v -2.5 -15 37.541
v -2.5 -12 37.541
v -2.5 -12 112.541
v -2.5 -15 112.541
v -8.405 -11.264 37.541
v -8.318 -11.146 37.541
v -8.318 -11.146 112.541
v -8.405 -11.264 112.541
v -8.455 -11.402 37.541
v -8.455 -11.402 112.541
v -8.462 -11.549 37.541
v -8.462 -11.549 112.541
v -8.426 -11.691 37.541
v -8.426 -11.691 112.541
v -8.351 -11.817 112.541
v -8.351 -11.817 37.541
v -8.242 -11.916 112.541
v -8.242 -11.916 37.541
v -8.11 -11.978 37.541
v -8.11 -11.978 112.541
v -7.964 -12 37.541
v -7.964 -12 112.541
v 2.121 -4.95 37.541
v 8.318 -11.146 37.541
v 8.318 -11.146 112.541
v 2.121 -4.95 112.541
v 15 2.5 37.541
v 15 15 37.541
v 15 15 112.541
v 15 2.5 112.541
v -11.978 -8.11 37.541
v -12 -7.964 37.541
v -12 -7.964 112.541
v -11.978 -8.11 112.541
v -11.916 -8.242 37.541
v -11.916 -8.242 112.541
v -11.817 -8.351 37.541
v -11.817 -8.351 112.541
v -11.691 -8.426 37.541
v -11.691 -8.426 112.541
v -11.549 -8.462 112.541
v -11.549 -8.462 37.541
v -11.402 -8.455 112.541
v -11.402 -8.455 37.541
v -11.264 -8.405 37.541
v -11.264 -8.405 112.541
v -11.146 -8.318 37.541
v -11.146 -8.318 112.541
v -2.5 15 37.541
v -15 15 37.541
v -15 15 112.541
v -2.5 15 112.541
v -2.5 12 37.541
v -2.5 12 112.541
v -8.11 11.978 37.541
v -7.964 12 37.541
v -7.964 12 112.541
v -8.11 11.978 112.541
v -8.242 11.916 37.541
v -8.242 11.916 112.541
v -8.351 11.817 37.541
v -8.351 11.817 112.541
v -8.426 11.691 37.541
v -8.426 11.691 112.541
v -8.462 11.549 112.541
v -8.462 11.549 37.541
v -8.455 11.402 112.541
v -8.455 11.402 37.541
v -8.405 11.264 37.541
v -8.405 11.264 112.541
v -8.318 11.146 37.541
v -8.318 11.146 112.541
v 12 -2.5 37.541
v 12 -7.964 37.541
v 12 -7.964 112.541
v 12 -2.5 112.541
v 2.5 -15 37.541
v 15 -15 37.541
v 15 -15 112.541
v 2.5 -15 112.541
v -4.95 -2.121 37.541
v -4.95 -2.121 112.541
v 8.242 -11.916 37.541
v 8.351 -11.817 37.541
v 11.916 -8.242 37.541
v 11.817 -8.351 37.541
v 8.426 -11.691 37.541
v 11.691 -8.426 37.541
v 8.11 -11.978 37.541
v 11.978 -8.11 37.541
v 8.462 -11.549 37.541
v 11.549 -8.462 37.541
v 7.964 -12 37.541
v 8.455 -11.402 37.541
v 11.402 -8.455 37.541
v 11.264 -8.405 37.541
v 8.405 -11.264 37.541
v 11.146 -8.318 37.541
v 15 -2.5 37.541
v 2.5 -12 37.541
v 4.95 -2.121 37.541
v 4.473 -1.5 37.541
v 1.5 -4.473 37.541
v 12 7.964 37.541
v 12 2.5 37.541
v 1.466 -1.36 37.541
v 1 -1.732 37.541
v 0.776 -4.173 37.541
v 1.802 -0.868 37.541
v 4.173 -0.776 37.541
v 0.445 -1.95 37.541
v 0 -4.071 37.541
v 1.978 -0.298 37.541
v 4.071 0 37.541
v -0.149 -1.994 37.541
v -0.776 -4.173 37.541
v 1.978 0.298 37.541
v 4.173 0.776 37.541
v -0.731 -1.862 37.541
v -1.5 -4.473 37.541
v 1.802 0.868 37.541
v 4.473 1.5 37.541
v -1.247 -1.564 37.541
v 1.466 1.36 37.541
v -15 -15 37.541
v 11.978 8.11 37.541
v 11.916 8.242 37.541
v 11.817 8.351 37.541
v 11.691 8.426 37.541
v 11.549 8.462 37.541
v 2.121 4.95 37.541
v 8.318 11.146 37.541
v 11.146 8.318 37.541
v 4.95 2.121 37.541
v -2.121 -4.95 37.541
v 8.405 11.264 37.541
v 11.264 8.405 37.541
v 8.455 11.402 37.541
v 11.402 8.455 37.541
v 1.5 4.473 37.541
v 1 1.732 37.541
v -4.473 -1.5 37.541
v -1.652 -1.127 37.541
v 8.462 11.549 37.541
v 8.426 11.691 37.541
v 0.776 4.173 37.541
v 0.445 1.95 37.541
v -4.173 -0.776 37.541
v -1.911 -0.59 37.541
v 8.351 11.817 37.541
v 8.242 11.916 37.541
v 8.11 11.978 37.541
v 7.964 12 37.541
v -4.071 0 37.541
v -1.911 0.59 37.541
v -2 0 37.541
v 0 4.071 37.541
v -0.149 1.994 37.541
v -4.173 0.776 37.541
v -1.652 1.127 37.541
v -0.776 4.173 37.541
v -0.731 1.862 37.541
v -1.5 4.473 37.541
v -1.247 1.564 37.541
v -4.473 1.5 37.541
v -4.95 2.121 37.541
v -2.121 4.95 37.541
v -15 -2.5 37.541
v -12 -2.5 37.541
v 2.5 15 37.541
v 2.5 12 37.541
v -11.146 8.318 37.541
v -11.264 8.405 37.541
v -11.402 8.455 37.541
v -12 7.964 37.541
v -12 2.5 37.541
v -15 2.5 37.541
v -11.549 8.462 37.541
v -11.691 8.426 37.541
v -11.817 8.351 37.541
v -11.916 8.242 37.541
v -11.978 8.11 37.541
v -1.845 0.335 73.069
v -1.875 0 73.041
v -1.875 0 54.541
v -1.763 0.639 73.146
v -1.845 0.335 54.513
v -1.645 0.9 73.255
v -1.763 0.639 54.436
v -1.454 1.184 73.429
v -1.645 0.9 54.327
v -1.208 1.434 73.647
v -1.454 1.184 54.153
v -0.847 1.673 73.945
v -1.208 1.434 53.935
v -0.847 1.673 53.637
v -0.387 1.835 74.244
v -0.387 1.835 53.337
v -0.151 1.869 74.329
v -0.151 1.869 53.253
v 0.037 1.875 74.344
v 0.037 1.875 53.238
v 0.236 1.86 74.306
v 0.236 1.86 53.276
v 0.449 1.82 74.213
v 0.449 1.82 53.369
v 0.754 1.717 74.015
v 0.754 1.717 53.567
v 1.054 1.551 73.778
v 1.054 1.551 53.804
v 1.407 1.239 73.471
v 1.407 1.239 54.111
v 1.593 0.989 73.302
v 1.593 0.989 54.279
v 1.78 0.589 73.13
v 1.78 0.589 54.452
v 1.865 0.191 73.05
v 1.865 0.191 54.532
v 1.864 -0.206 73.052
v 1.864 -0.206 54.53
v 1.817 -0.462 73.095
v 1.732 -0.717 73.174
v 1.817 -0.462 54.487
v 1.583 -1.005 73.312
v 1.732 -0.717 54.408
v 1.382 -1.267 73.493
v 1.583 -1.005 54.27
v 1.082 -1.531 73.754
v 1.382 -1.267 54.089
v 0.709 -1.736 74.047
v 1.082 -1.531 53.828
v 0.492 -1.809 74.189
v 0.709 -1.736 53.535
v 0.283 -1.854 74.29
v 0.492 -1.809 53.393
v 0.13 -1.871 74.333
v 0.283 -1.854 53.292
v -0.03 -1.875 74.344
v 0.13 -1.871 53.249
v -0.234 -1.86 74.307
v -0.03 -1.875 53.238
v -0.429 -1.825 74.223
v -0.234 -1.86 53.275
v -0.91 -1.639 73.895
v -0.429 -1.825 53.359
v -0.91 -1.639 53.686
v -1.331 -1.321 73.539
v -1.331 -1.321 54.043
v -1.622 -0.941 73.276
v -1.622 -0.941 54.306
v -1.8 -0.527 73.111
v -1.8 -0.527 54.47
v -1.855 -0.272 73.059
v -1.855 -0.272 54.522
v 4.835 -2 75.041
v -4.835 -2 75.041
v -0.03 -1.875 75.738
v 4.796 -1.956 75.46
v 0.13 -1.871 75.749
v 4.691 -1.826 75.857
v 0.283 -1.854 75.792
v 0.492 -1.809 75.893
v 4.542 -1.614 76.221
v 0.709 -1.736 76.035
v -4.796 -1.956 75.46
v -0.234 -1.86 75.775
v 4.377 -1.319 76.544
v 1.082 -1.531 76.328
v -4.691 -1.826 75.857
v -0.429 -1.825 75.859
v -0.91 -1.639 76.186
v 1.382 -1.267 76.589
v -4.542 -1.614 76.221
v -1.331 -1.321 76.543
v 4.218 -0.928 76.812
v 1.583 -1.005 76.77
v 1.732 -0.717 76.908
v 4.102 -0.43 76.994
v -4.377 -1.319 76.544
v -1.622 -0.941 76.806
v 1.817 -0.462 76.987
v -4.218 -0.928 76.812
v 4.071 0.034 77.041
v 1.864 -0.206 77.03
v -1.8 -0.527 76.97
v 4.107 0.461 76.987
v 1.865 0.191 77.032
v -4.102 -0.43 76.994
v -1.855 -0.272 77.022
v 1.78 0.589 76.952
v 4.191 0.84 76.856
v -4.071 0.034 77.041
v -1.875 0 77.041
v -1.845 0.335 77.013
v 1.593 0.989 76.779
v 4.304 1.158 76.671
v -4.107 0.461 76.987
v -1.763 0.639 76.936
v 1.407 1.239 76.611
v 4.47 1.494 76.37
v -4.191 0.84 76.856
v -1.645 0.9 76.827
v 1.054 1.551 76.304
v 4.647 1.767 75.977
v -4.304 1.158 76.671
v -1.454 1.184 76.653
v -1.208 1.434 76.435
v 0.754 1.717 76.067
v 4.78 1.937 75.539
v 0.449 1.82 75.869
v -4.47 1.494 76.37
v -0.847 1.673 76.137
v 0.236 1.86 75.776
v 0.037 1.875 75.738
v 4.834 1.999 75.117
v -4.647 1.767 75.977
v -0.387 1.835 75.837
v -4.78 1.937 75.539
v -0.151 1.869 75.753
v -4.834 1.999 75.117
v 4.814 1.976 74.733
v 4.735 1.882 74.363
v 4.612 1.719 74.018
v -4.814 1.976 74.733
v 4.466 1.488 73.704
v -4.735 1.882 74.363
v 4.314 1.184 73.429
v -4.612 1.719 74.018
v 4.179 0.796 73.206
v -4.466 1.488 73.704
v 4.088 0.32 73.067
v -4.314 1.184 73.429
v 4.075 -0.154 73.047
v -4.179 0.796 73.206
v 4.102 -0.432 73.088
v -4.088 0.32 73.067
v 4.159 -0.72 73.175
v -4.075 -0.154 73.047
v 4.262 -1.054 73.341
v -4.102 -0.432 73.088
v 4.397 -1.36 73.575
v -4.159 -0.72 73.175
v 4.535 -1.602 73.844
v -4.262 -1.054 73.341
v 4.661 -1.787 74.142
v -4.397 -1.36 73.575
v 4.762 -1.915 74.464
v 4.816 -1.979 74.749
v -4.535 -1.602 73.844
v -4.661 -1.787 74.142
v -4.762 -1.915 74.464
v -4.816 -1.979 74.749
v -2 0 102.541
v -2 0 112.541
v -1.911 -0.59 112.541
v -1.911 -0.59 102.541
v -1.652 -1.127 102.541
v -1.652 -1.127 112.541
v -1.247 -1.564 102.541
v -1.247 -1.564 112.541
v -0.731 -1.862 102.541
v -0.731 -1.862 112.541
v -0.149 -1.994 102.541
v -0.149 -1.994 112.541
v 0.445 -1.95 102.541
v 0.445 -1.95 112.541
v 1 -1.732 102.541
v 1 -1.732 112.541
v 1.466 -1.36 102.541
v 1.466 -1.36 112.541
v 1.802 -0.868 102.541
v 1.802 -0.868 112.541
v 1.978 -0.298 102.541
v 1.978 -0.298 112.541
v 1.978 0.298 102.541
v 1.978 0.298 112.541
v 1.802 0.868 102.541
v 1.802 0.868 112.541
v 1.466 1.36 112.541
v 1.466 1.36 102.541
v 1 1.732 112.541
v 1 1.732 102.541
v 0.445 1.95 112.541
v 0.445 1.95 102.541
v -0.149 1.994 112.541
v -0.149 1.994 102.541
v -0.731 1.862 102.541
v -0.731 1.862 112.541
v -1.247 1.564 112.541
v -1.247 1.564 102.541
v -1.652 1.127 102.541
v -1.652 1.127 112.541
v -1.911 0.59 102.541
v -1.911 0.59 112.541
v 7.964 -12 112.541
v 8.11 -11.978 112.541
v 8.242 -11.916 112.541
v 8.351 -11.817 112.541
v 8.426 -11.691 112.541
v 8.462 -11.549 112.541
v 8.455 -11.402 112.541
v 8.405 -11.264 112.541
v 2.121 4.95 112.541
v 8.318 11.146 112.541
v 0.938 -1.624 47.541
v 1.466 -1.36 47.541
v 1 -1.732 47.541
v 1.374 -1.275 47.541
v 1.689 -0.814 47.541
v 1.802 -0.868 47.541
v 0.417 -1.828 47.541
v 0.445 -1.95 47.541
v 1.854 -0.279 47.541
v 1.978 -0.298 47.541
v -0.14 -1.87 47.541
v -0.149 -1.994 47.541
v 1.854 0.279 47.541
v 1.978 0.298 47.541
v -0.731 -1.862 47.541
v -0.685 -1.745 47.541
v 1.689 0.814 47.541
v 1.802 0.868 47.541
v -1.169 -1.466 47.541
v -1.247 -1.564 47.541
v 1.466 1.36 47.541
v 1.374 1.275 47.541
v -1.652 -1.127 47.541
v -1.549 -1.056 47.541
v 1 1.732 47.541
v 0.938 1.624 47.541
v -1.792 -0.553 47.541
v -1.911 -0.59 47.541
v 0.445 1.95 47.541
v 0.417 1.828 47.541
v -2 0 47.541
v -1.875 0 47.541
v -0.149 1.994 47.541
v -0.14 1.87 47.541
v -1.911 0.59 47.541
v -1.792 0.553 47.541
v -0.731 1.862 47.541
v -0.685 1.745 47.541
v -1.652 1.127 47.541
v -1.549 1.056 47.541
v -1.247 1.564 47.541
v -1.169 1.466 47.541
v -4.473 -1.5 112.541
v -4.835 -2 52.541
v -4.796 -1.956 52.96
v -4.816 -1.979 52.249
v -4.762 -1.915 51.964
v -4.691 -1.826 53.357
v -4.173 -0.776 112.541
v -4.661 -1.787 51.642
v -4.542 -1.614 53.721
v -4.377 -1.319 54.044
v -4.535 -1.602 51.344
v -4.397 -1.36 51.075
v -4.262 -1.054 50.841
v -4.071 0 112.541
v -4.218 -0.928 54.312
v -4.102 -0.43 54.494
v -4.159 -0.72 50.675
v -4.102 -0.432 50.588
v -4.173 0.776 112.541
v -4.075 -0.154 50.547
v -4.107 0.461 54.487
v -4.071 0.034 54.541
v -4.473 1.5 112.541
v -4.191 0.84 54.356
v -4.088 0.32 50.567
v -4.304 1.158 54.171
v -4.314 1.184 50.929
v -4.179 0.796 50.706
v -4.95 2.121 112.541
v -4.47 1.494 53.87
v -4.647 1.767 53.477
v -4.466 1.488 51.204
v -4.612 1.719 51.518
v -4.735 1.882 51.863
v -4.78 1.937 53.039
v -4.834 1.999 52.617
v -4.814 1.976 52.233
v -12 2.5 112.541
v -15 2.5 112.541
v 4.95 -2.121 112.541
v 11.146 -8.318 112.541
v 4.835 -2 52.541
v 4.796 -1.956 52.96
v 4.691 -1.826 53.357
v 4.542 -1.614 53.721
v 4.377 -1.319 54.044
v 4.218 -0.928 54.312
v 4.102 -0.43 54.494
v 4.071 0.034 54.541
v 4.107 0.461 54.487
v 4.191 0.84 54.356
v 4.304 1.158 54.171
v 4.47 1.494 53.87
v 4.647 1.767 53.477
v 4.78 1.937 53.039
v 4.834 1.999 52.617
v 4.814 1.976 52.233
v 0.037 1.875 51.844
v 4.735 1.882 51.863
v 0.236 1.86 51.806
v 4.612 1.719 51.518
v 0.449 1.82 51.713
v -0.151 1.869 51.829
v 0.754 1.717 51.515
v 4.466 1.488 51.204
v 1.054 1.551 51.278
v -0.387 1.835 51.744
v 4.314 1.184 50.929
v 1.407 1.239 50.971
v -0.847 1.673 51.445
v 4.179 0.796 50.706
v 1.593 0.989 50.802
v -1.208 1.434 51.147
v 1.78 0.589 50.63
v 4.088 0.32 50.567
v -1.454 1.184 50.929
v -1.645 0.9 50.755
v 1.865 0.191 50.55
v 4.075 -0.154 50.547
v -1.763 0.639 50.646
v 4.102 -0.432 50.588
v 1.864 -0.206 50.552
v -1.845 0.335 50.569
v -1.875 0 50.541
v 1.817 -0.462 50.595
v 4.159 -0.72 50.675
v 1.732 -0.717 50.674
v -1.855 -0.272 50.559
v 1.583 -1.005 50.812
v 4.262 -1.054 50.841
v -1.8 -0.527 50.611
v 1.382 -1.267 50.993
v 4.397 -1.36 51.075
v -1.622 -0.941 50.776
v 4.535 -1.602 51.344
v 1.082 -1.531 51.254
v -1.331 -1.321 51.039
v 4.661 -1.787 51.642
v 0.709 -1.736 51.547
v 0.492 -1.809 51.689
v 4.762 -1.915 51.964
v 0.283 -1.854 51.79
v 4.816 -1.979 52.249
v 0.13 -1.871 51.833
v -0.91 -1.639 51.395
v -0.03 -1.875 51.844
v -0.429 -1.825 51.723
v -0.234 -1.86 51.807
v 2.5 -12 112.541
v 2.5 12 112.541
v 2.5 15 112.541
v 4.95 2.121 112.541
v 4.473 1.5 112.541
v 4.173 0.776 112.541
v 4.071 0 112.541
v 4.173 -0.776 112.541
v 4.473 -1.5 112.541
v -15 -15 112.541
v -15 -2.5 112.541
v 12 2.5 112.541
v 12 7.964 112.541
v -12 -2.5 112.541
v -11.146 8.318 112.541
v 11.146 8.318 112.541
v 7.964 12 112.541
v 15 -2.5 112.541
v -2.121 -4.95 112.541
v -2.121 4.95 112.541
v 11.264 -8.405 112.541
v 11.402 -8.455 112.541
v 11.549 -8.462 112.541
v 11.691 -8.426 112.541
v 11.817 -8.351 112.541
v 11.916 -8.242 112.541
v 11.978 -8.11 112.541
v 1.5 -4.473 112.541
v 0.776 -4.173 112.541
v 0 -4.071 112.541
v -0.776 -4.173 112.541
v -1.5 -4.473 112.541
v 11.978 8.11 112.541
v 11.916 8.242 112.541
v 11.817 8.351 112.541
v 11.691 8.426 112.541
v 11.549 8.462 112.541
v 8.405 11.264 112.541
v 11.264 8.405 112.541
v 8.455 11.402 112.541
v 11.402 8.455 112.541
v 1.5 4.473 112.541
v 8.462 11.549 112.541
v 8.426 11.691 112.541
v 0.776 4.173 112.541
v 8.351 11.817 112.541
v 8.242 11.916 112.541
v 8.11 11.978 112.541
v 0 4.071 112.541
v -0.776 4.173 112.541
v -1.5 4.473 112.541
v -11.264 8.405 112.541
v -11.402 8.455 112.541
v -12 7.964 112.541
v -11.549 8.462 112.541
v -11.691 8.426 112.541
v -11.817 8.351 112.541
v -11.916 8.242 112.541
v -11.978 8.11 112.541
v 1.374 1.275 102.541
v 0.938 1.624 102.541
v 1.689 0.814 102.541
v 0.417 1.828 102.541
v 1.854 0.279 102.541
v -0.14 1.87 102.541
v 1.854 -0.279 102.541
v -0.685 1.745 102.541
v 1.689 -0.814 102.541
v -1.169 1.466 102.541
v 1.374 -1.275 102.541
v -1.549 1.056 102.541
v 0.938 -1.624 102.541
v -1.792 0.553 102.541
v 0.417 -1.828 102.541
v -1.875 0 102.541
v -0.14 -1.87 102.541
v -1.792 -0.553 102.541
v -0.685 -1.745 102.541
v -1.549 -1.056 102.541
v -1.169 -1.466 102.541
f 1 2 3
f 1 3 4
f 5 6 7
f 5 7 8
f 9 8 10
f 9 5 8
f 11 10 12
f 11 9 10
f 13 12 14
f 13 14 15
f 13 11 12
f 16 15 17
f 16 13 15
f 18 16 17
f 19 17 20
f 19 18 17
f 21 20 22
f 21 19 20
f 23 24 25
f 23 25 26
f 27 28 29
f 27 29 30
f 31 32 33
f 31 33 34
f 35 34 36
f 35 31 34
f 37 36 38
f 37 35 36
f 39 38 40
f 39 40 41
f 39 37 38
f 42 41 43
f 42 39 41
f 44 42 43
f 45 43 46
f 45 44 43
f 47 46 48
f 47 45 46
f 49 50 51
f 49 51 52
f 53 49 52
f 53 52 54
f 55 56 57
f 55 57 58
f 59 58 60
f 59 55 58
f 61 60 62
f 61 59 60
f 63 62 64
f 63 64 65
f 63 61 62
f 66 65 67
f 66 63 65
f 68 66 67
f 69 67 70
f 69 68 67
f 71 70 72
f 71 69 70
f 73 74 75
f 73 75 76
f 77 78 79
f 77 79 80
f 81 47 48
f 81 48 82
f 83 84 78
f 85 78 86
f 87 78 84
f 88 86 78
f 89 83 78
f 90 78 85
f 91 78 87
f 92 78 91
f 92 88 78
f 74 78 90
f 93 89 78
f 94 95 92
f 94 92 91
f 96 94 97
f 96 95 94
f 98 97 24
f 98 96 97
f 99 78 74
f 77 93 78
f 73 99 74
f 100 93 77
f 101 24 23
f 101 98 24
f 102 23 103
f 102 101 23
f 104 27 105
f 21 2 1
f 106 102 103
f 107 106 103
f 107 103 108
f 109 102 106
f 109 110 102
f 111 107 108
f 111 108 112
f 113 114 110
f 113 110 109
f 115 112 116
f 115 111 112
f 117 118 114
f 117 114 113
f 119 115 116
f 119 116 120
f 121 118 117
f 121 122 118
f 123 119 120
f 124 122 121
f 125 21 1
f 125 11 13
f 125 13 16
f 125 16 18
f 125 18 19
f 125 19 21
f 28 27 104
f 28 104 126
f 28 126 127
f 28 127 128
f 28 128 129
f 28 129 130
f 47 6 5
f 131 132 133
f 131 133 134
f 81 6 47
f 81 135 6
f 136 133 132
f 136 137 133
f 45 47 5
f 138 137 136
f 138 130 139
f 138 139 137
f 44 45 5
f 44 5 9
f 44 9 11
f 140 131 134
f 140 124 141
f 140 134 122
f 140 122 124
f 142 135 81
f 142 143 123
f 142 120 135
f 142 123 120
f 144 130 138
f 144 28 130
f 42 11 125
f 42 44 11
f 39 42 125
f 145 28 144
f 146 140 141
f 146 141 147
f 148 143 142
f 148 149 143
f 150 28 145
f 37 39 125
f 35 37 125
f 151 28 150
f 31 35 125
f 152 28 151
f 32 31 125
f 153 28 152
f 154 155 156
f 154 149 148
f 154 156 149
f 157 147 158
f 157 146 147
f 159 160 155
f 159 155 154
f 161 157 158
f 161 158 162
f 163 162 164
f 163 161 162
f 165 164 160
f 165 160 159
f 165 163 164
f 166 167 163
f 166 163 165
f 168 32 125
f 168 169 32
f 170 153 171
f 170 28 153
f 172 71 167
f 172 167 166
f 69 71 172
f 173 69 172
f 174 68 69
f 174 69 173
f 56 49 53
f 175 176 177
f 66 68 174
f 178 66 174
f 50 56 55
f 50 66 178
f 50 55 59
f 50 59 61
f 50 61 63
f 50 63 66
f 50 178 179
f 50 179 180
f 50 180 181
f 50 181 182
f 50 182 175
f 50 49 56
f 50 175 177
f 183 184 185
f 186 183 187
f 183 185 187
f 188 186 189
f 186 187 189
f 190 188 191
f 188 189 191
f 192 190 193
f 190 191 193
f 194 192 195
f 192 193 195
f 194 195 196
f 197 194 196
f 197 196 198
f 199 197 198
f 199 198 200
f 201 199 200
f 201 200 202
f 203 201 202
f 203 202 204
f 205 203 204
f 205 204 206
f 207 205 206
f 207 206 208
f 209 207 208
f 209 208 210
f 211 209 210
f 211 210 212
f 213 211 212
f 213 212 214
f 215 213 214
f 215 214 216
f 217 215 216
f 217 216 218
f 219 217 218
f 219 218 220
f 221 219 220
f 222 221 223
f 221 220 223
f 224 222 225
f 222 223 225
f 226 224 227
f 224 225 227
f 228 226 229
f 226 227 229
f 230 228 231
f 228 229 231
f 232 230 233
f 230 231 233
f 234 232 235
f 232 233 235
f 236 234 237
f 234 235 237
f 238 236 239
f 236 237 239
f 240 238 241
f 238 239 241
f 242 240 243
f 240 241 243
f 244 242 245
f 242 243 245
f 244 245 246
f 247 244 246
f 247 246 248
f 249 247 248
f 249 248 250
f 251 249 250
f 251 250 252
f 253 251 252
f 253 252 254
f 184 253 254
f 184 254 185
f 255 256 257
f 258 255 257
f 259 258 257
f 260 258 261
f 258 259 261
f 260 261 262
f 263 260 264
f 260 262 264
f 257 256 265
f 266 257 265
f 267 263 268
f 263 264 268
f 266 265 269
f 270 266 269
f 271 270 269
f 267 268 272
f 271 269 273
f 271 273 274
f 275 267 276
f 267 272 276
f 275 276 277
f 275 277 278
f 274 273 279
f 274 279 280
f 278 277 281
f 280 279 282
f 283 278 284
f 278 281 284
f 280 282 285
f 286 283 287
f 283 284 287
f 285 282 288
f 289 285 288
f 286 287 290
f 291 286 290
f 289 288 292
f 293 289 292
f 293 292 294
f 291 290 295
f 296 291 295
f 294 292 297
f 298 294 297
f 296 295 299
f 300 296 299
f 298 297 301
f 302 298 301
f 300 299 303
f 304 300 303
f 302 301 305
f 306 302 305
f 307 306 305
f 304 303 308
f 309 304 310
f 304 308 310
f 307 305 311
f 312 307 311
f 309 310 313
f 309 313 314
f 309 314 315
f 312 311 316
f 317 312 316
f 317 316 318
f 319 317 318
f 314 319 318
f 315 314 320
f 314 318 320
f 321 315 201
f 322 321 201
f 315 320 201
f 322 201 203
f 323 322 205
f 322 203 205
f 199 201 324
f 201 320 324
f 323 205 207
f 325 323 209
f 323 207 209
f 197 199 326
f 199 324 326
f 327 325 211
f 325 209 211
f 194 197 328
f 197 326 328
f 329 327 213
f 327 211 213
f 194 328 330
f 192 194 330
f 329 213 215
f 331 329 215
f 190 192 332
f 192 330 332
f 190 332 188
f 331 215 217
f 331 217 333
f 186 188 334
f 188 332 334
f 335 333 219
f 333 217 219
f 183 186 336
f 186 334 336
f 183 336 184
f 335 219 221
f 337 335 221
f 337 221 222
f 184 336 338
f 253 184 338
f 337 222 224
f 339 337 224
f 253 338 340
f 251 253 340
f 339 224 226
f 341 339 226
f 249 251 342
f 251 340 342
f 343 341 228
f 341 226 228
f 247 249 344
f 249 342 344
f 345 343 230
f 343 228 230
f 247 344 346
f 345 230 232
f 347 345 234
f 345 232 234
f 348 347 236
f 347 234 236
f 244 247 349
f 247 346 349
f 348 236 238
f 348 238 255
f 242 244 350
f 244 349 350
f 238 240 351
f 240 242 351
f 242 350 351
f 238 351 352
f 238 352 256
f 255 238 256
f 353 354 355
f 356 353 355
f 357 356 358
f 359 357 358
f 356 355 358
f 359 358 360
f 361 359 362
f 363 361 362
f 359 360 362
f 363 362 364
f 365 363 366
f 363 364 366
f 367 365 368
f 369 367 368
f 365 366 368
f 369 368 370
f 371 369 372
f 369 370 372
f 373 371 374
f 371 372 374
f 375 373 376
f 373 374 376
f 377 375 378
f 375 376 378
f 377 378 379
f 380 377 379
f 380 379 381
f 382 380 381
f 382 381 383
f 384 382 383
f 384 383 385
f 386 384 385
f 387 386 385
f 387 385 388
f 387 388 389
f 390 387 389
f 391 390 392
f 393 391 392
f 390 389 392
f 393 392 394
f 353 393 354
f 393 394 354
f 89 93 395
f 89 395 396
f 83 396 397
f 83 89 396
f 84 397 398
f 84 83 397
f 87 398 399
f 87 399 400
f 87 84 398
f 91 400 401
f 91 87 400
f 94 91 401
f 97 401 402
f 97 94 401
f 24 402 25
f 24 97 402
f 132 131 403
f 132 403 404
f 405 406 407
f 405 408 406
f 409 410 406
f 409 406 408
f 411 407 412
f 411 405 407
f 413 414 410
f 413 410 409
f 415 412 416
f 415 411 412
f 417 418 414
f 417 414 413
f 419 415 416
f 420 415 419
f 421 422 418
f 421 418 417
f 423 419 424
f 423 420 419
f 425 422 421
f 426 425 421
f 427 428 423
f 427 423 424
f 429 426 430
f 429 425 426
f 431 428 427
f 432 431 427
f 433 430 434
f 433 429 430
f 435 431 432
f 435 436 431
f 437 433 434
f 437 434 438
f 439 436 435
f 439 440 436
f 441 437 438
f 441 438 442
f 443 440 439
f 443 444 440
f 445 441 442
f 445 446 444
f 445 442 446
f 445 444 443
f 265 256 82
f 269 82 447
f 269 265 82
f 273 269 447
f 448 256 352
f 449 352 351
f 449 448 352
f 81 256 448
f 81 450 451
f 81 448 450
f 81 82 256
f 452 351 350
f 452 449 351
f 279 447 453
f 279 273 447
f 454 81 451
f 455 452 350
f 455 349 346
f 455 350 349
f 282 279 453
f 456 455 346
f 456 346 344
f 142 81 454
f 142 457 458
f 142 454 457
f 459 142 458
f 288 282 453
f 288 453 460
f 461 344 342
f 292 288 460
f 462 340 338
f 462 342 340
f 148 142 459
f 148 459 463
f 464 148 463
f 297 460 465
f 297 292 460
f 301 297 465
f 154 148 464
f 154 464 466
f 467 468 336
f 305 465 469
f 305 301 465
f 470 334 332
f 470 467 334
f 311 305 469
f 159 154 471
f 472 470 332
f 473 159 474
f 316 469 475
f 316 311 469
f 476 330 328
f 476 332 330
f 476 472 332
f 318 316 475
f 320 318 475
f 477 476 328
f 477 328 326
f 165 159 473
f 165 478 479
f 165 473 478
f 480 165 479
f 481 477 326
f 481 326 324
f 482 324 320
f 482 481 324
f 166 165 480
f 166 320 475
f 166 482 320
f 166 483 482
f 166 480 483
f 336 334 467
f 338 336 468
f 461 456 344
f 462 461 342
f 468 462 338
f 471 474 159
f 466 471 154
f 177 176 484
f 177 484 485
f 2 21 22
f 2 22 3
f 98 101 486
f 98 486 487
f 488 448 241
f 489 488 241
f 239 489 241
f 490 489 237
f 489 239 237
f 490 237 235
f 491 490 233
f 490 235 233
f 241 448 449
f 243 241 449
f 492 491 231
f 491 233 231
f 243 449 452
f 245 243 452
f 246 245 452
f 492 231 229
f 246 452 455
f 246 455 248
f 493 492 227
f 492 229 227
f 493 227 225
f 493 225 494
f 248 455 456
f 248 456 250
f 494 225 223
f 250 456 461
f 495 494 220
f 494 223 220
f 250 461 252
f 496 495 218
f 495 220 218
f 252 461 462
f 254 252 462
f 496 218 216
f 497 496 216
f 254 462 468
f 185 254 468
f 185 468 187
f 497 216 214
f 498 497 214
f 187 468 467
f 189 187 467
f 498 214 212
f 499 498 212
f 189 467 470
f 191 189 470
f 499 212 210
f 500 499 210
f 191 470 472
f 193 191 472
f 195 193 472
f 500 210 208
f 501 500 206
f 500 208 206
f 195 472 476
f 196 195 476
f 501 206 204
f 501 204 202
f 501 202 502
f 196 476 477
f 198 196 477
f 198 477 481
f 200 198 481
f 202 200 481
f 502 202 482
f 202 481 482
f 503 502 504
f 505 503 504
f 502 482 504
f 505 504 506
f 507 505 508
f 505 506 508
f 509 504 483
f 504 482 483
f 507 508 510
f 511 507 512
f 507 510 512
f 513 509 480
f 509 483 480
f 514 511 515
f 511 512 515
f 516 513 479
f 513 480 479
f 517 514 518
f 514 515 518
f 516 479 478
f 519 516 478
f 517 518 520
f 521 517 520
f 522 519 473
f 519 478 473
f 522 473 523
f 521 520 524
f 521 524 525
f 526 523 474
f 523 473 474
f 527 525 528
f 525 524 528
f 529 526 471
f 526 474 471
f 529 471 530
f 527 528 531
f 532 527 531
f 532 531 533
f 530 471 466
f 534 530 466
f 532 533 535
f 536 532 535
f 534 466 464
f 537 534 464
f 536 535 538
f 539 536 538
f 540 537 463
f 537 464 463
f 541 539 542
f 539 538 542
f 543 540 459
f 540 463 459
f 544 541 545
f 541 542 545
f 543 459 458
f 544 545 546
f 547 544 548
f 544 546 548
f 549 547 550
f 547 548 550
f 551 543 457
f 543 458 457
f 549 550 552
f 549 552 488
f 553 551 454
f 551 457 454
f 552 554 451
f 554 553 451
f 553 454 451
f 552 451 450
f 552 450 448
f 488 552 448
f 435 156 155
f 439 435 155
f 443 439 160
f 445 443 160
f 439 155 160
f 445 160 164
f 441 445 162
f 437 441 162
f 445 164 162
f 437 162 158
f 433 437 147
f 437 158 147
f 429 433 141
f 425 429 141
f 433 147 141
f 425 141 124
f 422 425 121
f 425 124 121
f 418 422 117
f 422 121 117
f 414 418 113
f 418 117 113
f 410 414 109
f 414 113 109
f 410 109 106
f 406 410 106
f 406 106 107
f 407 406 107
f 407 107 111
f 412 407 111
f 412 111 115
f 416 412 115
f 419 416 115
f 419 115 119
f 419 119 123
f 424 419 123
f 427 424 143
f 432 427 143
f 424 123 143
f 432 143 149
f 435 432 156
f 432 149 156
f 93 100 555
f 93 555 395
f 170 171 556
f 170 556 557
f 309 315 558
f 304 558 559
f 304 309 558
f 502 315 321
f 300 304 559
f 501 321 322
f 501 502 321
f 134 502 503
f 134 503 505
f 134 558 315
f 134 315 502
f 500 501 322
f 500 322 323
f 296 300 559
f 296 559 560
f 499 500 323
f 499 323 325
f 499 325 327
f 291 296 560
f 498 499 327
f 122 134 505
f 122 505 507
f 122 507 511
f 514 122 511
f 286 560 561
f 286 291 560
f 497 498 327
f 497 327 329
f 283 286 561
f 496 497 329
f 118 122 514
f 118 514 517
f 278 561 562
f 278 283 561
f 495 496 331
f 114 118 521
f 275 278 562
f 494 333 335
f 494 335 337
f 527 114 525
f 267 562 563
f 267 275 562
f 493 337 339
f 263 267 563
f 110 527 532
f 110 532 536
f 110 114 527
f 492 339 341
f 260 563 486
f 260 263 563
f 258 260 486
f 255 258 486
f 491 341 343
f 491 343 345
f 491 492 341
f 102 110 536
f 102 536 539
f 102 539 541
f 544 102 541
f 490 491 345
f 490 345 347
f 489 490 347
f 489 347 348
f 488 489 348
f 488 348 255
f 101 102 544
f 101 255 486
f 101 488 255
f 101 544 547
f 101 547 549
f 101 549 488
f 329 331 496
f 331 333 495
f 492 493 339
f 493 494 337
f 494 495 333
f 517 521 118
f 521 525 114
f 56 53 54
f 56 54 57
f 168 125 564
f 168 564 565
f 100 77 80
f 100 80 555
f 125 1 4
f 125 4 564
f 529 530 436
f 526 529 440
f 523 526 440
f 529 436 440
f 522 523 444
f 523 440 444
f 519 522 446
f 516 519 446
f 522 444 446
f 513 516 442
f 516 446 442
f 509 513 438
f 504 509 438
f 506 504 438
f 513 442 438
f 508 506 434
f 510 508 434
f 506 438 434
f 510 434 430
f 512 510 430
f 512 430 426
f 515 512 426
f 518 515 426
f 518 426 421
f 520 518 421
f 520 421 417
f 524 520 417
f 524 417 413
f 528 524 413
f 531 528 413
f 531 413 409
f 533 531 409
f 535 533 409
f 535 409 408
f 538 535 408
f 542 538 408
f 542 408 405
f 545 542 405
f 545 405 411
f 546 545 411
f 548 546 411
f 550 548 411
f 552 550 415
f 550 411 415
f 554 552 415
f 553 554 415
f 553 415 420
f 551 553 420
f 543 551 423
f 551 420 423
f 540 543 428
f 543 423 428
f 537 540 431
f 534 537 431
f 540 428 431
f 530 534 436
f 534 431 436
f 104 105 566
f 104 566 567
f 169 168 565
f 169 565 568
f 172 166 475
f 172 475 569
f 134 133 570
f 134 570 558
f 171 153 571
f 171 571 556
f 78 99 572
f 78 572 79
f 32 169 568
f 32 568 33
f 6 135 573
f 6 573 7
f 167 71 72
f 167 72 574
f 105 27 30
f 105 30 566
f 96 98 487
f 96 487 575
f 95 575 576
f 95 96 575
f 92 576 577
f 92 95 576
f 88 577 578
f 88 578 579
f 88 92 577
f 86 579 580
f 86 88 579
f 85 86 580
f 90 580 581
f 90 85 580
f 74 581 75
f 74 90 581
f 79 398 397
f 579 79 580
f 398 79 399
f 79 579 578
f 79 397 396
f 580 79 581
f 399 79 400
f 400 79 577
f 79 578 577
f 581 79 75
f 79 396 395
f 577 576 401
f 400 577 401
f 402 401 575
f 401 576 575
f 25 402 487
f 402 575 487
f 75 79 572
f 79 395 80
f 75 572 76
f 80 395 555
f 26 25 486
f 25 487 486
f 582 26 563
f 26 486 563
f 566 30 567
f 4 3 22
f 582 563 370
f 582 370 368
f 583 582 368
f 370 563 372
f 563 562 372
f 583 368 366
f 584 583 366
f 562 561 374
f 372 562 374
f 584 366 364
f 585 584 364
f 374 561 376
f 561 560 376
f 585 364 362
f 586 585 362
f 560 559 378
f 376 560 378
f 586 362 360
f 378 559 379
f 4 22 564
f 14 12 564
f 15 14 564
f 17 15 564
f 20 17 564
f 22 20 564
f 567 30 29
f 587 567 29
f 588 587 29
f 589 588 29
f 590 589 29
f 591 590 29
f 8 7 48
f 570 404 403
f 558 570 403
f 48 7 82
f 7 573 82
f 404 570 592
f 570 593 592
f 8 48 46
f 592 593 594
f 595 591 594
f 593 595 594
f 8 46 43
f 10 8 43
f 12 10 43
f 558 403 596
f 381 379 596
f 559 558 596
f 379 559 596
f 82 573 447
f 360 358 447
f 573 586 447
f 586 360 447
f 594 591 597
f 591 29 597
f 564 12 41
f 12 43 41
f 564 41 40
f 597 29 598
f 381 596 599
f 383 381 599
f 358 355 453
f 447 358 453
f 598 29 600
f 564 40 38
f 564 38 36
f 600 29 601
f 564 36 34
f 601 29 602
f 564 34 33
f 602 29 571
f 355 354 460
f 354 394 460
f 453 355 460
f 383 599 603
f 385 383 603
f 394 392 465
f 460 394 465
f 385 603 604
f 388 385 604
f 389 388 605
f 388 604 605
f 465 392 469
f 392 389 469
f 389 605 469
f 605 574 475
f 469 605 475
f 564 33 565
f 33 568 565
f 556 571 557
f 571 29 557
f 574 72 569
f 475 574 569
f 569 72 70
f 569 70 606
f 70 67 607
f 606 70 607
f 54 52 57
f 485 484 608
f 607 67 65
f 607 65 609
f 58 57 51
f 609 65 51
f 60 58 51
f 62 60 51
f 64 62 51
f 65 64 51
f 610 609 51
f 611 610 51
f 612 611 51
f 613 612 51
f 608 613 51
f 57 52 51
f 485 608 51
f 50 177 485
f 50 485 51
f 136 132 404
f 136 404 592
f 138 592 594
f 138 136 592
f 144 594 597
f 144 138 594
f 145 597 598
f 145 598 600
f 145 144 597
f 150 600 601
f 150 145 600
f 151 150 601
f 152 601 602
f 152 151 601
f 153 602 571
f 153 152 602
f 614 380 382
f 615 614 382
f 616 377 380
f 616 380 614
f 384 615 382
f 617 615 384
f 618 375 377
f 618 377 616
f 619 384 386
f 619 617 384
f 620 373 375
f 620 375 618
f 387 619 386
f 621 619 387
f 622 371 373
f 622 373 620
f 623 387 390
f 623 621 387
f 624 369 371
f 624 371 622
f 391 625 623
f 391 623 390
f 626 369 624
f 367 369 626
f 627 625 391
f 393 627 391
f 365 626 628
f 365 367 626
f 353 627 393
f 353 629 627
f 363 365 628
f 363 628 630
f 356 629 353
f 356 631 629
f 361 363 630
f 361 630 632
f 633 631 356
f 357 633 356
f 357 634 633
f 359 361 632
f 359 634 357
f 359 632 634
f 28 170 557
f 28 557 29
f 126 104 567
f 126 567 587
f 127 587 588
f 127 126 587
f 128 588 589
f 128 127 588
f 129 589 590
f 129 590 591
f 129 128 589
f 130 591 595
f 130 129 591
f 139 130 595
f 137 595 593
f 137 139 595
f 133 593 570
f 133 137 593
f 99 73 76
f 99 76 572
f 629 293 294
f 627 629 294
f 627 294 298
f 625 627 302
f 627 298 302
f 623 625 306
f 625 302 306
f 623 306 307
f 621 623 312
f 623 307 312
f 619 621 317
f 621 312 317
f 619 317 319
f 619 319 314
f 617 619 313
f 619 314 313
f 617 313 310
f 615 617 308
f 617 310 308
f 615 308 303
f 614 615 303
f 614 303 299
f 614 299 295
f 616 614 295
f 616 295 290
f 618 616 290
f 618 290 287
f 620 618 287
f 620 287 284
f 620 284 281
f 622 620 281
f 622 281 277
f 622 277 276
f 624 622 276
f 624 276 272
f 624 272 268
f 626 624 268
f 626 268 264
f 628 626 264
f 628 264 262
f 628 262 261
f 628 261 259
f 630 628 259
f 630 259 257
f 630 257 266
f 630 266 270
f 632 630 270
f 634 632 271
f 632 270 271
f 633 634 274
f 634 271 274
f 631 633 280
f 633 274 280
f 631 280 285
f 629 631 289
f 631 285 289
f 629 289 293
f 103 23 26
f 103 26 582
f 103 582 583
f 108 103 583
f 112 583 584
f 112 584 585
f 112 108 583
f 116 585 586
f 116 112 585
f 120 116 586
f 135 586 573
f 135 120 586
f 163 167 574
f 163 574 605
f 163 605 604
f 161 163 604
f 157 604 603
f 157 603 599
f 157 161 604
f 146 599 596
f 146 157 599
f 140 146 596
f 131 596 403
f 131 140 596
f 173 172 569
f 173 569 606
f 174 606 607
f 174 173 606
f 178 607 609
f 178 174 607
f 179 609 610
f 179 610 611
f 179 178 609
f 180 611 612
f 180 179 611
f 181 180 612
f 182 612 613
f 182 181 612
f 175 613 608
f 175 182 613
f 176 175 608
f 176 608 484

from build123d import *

# Parameters (mm, degrees)
BOSS_EXTRUDE1_DEPTH = 150
SKETCH2_R           = 3.75
CUT_EXTRUDE1_DEPTH  = 151
SKETCH3_R           = 4
CUT_EXTRUDE2_DEPTH  = 61
SKETCH5_R           = 4
CUT_EXTRUDE5_DEPTH  = 20
SKETCH6_R           = 4
CUT_EXTRUDE6_DEPTH  = 20
SCALE1_SCALE        = 0.5


with BuildPart() as part:
    # Sketch1 → Boss-Extrude1 (new body)
    with BuildSketch(Plane.XY):
        with BuildLine():
            Line((-5, 30), (-5, 24))
            Line((-5, 24), (-15.928932188, 24))
            ThreePointArc((-15.928932188, 24), (-16.852811721, 23.382683432), (-16.636038969, 22.292893219))
            Line((-16.636038969, 22.292893219), (-4.242640687, 9.899494937))
            ThreePointArc((-4.242640687, 9.899494937), (0, 8.142135624), (4.242640687, 9.899494937))
            Line((4.242640687, 9.899494937), (16.636038969, 22.292893219))
            ThreePointArc((16.636038969, 22.292893219), (16.852811721, 23.382683432), (15.928932188, 24))
            Line((15.928932188, 24), (5, 24))
            Line((5, 24), (5, 30))
            Line((5, 30), (30, 30))
            Line((30, 30), (30, 5))
            Line((30, 5), (24, 5))
            Line((24, 5), (24, 15.928932188))
            ThreePointArc((24, 15.928932188), (23.382683432, 16.852811721), (22.292893219, 16.636038969))
            Line((22.292893219, 16.636038969), (9.899494937, 4.242640687))
            ThreePointArc((9.899494937, 4.242640687), (8.142135624, 0), (9.899494937, -4.242640687))
            Line((9.899494937, -4.242640687), (22.292893219, -16.636038969))
            ThreePointArc((22.292893219, -16.636038969), (23.382683432, -16.852811721), (24, -15.928932188))
            Line((24, -15.928932188), (24, -5))
            Line((24, -5), (30, -5))
            Line((30, -5), (30, -30))
            Line((30, -30), (5, -30))
            Line((5, -30), (5, -24))
            Line((5, -24), (15.928932188, -24))
            ThreePointArc((15.928932188, -24), (16.852811721, -23.382683432), (16.636038969, -22.292893219))
            Line((16.636038969, -22.292893219), (4.242640687, -9.899494937))
            ThreePointArc((4.242640687, -9.899494937), (0, -8.142135624), (-4.242640687, -9.899494937))
            Line((-4.242640687, -9.899494937), (-16.636038969, -22.292893219))
            ThreePointArc((-16.636038969, -22.292893219), (-16.852811721, -23.382683432), (-15.928932188, -24))
            Line((-15.928932188, -24), (-5, -24))
            Line((-5, -24), (-5, -30))
            Line((-5, -30), (-30, -30))
            Line((-30, -30), (-30, -5))
            Line((-30, -5), (-24, -5))
            Line((-24, -5), (-24, -15.928932188))
            ThreePointArc((-24, -15.928932188), (-23.382683432, -16.852811721), (-22.292893219, -16.636038969))
            Line((-22.292893219, -16.636038969), (-9.899494937, -4.242640687))
            ThreePointArc((-9.899494937, -4.242640687), (-8.142135624, 0), (-9.899494937, 4.242640687))
            Line((-9.899494937, 4.242640687), (-22.292893219, 16.636038969))
            ThreePointArc((-22.292893219, 16.636038969), (-23.382683432, 16.852811721), (-24, 15.928932188))
            Line((-24, 15.928932188), (-24, 5))
            Line((-24, 5), (-30, 5))
            Line((-30, 5), (-30, 30))
            Line((-30, 30), (-5, 30))
        make_face()
    extrude(amount=BOSS_EXTRUDE1_DEPTH)

    # Sketch2 → Cut-Extrude1 (cut, through all)
    with BuildSketch(Plane(origin=(0, 0, 0), x_dir=(-1, 0, 0), z_dir=(0, 0, -1))):
        Circle(SKETCH2_R)
    extrude(amount=-CUT_EXTRUDE1_DEPTH, mode=Mode.SUBTRACT)

    # Sketch3 → Cut-Extrude2 (cut, through all)
    with BuildSketch(Plane.ZY.offset(30)):
        with Locations(Location((75, 0, 0), (0, 0, 270))):  # turned: the seam where the file's is
            Circle(SKETCH3_R)
        with Locations(Location((30, 0, 0), (0, 0, 270))):  # turned: the seam where the file's is
            Circle(SKETCH3_R)
    extrude(amount=-CUT_EXTRUDE2_DEPTH, mode=Mode.SUBTRACT)

    # Sketch5 → Cut-Extrude5 (cut)
    with BuildSketch(Plane(origin=(0, 0, 0), x_dir=(-1, 0, 0), z_dir=(0, 0, -1))):
        Circle(SKETCH5_R)
    extrude(amount=-CUT_EXTRUDE5_DEPTH, mode=Mode.SUBTRACT)

    # Sketch6 → Cut-Extrude6 (cut)
    with BuildSketch(Plane.XY.offset(150)):
        with Locations(Location((0, 0, 0), (0, 0, 180))):  # turned: the seam where the file's is
            Circle(SKETCH6_R)
    extrude(amount=-CUT_EXTRUDE6_DEPTH, mode=Mode.SUBTRACT)


with BuildPart() as part_1:
    # Scale1: scaled about (5.21e-07, -1.92e-07, 75.081821445)
    add(part.part.scale(SCALE1_SCALE).moved(Location((2.6e-07, -9.6e-08, 37.540910723))))


solid = part_1.part
